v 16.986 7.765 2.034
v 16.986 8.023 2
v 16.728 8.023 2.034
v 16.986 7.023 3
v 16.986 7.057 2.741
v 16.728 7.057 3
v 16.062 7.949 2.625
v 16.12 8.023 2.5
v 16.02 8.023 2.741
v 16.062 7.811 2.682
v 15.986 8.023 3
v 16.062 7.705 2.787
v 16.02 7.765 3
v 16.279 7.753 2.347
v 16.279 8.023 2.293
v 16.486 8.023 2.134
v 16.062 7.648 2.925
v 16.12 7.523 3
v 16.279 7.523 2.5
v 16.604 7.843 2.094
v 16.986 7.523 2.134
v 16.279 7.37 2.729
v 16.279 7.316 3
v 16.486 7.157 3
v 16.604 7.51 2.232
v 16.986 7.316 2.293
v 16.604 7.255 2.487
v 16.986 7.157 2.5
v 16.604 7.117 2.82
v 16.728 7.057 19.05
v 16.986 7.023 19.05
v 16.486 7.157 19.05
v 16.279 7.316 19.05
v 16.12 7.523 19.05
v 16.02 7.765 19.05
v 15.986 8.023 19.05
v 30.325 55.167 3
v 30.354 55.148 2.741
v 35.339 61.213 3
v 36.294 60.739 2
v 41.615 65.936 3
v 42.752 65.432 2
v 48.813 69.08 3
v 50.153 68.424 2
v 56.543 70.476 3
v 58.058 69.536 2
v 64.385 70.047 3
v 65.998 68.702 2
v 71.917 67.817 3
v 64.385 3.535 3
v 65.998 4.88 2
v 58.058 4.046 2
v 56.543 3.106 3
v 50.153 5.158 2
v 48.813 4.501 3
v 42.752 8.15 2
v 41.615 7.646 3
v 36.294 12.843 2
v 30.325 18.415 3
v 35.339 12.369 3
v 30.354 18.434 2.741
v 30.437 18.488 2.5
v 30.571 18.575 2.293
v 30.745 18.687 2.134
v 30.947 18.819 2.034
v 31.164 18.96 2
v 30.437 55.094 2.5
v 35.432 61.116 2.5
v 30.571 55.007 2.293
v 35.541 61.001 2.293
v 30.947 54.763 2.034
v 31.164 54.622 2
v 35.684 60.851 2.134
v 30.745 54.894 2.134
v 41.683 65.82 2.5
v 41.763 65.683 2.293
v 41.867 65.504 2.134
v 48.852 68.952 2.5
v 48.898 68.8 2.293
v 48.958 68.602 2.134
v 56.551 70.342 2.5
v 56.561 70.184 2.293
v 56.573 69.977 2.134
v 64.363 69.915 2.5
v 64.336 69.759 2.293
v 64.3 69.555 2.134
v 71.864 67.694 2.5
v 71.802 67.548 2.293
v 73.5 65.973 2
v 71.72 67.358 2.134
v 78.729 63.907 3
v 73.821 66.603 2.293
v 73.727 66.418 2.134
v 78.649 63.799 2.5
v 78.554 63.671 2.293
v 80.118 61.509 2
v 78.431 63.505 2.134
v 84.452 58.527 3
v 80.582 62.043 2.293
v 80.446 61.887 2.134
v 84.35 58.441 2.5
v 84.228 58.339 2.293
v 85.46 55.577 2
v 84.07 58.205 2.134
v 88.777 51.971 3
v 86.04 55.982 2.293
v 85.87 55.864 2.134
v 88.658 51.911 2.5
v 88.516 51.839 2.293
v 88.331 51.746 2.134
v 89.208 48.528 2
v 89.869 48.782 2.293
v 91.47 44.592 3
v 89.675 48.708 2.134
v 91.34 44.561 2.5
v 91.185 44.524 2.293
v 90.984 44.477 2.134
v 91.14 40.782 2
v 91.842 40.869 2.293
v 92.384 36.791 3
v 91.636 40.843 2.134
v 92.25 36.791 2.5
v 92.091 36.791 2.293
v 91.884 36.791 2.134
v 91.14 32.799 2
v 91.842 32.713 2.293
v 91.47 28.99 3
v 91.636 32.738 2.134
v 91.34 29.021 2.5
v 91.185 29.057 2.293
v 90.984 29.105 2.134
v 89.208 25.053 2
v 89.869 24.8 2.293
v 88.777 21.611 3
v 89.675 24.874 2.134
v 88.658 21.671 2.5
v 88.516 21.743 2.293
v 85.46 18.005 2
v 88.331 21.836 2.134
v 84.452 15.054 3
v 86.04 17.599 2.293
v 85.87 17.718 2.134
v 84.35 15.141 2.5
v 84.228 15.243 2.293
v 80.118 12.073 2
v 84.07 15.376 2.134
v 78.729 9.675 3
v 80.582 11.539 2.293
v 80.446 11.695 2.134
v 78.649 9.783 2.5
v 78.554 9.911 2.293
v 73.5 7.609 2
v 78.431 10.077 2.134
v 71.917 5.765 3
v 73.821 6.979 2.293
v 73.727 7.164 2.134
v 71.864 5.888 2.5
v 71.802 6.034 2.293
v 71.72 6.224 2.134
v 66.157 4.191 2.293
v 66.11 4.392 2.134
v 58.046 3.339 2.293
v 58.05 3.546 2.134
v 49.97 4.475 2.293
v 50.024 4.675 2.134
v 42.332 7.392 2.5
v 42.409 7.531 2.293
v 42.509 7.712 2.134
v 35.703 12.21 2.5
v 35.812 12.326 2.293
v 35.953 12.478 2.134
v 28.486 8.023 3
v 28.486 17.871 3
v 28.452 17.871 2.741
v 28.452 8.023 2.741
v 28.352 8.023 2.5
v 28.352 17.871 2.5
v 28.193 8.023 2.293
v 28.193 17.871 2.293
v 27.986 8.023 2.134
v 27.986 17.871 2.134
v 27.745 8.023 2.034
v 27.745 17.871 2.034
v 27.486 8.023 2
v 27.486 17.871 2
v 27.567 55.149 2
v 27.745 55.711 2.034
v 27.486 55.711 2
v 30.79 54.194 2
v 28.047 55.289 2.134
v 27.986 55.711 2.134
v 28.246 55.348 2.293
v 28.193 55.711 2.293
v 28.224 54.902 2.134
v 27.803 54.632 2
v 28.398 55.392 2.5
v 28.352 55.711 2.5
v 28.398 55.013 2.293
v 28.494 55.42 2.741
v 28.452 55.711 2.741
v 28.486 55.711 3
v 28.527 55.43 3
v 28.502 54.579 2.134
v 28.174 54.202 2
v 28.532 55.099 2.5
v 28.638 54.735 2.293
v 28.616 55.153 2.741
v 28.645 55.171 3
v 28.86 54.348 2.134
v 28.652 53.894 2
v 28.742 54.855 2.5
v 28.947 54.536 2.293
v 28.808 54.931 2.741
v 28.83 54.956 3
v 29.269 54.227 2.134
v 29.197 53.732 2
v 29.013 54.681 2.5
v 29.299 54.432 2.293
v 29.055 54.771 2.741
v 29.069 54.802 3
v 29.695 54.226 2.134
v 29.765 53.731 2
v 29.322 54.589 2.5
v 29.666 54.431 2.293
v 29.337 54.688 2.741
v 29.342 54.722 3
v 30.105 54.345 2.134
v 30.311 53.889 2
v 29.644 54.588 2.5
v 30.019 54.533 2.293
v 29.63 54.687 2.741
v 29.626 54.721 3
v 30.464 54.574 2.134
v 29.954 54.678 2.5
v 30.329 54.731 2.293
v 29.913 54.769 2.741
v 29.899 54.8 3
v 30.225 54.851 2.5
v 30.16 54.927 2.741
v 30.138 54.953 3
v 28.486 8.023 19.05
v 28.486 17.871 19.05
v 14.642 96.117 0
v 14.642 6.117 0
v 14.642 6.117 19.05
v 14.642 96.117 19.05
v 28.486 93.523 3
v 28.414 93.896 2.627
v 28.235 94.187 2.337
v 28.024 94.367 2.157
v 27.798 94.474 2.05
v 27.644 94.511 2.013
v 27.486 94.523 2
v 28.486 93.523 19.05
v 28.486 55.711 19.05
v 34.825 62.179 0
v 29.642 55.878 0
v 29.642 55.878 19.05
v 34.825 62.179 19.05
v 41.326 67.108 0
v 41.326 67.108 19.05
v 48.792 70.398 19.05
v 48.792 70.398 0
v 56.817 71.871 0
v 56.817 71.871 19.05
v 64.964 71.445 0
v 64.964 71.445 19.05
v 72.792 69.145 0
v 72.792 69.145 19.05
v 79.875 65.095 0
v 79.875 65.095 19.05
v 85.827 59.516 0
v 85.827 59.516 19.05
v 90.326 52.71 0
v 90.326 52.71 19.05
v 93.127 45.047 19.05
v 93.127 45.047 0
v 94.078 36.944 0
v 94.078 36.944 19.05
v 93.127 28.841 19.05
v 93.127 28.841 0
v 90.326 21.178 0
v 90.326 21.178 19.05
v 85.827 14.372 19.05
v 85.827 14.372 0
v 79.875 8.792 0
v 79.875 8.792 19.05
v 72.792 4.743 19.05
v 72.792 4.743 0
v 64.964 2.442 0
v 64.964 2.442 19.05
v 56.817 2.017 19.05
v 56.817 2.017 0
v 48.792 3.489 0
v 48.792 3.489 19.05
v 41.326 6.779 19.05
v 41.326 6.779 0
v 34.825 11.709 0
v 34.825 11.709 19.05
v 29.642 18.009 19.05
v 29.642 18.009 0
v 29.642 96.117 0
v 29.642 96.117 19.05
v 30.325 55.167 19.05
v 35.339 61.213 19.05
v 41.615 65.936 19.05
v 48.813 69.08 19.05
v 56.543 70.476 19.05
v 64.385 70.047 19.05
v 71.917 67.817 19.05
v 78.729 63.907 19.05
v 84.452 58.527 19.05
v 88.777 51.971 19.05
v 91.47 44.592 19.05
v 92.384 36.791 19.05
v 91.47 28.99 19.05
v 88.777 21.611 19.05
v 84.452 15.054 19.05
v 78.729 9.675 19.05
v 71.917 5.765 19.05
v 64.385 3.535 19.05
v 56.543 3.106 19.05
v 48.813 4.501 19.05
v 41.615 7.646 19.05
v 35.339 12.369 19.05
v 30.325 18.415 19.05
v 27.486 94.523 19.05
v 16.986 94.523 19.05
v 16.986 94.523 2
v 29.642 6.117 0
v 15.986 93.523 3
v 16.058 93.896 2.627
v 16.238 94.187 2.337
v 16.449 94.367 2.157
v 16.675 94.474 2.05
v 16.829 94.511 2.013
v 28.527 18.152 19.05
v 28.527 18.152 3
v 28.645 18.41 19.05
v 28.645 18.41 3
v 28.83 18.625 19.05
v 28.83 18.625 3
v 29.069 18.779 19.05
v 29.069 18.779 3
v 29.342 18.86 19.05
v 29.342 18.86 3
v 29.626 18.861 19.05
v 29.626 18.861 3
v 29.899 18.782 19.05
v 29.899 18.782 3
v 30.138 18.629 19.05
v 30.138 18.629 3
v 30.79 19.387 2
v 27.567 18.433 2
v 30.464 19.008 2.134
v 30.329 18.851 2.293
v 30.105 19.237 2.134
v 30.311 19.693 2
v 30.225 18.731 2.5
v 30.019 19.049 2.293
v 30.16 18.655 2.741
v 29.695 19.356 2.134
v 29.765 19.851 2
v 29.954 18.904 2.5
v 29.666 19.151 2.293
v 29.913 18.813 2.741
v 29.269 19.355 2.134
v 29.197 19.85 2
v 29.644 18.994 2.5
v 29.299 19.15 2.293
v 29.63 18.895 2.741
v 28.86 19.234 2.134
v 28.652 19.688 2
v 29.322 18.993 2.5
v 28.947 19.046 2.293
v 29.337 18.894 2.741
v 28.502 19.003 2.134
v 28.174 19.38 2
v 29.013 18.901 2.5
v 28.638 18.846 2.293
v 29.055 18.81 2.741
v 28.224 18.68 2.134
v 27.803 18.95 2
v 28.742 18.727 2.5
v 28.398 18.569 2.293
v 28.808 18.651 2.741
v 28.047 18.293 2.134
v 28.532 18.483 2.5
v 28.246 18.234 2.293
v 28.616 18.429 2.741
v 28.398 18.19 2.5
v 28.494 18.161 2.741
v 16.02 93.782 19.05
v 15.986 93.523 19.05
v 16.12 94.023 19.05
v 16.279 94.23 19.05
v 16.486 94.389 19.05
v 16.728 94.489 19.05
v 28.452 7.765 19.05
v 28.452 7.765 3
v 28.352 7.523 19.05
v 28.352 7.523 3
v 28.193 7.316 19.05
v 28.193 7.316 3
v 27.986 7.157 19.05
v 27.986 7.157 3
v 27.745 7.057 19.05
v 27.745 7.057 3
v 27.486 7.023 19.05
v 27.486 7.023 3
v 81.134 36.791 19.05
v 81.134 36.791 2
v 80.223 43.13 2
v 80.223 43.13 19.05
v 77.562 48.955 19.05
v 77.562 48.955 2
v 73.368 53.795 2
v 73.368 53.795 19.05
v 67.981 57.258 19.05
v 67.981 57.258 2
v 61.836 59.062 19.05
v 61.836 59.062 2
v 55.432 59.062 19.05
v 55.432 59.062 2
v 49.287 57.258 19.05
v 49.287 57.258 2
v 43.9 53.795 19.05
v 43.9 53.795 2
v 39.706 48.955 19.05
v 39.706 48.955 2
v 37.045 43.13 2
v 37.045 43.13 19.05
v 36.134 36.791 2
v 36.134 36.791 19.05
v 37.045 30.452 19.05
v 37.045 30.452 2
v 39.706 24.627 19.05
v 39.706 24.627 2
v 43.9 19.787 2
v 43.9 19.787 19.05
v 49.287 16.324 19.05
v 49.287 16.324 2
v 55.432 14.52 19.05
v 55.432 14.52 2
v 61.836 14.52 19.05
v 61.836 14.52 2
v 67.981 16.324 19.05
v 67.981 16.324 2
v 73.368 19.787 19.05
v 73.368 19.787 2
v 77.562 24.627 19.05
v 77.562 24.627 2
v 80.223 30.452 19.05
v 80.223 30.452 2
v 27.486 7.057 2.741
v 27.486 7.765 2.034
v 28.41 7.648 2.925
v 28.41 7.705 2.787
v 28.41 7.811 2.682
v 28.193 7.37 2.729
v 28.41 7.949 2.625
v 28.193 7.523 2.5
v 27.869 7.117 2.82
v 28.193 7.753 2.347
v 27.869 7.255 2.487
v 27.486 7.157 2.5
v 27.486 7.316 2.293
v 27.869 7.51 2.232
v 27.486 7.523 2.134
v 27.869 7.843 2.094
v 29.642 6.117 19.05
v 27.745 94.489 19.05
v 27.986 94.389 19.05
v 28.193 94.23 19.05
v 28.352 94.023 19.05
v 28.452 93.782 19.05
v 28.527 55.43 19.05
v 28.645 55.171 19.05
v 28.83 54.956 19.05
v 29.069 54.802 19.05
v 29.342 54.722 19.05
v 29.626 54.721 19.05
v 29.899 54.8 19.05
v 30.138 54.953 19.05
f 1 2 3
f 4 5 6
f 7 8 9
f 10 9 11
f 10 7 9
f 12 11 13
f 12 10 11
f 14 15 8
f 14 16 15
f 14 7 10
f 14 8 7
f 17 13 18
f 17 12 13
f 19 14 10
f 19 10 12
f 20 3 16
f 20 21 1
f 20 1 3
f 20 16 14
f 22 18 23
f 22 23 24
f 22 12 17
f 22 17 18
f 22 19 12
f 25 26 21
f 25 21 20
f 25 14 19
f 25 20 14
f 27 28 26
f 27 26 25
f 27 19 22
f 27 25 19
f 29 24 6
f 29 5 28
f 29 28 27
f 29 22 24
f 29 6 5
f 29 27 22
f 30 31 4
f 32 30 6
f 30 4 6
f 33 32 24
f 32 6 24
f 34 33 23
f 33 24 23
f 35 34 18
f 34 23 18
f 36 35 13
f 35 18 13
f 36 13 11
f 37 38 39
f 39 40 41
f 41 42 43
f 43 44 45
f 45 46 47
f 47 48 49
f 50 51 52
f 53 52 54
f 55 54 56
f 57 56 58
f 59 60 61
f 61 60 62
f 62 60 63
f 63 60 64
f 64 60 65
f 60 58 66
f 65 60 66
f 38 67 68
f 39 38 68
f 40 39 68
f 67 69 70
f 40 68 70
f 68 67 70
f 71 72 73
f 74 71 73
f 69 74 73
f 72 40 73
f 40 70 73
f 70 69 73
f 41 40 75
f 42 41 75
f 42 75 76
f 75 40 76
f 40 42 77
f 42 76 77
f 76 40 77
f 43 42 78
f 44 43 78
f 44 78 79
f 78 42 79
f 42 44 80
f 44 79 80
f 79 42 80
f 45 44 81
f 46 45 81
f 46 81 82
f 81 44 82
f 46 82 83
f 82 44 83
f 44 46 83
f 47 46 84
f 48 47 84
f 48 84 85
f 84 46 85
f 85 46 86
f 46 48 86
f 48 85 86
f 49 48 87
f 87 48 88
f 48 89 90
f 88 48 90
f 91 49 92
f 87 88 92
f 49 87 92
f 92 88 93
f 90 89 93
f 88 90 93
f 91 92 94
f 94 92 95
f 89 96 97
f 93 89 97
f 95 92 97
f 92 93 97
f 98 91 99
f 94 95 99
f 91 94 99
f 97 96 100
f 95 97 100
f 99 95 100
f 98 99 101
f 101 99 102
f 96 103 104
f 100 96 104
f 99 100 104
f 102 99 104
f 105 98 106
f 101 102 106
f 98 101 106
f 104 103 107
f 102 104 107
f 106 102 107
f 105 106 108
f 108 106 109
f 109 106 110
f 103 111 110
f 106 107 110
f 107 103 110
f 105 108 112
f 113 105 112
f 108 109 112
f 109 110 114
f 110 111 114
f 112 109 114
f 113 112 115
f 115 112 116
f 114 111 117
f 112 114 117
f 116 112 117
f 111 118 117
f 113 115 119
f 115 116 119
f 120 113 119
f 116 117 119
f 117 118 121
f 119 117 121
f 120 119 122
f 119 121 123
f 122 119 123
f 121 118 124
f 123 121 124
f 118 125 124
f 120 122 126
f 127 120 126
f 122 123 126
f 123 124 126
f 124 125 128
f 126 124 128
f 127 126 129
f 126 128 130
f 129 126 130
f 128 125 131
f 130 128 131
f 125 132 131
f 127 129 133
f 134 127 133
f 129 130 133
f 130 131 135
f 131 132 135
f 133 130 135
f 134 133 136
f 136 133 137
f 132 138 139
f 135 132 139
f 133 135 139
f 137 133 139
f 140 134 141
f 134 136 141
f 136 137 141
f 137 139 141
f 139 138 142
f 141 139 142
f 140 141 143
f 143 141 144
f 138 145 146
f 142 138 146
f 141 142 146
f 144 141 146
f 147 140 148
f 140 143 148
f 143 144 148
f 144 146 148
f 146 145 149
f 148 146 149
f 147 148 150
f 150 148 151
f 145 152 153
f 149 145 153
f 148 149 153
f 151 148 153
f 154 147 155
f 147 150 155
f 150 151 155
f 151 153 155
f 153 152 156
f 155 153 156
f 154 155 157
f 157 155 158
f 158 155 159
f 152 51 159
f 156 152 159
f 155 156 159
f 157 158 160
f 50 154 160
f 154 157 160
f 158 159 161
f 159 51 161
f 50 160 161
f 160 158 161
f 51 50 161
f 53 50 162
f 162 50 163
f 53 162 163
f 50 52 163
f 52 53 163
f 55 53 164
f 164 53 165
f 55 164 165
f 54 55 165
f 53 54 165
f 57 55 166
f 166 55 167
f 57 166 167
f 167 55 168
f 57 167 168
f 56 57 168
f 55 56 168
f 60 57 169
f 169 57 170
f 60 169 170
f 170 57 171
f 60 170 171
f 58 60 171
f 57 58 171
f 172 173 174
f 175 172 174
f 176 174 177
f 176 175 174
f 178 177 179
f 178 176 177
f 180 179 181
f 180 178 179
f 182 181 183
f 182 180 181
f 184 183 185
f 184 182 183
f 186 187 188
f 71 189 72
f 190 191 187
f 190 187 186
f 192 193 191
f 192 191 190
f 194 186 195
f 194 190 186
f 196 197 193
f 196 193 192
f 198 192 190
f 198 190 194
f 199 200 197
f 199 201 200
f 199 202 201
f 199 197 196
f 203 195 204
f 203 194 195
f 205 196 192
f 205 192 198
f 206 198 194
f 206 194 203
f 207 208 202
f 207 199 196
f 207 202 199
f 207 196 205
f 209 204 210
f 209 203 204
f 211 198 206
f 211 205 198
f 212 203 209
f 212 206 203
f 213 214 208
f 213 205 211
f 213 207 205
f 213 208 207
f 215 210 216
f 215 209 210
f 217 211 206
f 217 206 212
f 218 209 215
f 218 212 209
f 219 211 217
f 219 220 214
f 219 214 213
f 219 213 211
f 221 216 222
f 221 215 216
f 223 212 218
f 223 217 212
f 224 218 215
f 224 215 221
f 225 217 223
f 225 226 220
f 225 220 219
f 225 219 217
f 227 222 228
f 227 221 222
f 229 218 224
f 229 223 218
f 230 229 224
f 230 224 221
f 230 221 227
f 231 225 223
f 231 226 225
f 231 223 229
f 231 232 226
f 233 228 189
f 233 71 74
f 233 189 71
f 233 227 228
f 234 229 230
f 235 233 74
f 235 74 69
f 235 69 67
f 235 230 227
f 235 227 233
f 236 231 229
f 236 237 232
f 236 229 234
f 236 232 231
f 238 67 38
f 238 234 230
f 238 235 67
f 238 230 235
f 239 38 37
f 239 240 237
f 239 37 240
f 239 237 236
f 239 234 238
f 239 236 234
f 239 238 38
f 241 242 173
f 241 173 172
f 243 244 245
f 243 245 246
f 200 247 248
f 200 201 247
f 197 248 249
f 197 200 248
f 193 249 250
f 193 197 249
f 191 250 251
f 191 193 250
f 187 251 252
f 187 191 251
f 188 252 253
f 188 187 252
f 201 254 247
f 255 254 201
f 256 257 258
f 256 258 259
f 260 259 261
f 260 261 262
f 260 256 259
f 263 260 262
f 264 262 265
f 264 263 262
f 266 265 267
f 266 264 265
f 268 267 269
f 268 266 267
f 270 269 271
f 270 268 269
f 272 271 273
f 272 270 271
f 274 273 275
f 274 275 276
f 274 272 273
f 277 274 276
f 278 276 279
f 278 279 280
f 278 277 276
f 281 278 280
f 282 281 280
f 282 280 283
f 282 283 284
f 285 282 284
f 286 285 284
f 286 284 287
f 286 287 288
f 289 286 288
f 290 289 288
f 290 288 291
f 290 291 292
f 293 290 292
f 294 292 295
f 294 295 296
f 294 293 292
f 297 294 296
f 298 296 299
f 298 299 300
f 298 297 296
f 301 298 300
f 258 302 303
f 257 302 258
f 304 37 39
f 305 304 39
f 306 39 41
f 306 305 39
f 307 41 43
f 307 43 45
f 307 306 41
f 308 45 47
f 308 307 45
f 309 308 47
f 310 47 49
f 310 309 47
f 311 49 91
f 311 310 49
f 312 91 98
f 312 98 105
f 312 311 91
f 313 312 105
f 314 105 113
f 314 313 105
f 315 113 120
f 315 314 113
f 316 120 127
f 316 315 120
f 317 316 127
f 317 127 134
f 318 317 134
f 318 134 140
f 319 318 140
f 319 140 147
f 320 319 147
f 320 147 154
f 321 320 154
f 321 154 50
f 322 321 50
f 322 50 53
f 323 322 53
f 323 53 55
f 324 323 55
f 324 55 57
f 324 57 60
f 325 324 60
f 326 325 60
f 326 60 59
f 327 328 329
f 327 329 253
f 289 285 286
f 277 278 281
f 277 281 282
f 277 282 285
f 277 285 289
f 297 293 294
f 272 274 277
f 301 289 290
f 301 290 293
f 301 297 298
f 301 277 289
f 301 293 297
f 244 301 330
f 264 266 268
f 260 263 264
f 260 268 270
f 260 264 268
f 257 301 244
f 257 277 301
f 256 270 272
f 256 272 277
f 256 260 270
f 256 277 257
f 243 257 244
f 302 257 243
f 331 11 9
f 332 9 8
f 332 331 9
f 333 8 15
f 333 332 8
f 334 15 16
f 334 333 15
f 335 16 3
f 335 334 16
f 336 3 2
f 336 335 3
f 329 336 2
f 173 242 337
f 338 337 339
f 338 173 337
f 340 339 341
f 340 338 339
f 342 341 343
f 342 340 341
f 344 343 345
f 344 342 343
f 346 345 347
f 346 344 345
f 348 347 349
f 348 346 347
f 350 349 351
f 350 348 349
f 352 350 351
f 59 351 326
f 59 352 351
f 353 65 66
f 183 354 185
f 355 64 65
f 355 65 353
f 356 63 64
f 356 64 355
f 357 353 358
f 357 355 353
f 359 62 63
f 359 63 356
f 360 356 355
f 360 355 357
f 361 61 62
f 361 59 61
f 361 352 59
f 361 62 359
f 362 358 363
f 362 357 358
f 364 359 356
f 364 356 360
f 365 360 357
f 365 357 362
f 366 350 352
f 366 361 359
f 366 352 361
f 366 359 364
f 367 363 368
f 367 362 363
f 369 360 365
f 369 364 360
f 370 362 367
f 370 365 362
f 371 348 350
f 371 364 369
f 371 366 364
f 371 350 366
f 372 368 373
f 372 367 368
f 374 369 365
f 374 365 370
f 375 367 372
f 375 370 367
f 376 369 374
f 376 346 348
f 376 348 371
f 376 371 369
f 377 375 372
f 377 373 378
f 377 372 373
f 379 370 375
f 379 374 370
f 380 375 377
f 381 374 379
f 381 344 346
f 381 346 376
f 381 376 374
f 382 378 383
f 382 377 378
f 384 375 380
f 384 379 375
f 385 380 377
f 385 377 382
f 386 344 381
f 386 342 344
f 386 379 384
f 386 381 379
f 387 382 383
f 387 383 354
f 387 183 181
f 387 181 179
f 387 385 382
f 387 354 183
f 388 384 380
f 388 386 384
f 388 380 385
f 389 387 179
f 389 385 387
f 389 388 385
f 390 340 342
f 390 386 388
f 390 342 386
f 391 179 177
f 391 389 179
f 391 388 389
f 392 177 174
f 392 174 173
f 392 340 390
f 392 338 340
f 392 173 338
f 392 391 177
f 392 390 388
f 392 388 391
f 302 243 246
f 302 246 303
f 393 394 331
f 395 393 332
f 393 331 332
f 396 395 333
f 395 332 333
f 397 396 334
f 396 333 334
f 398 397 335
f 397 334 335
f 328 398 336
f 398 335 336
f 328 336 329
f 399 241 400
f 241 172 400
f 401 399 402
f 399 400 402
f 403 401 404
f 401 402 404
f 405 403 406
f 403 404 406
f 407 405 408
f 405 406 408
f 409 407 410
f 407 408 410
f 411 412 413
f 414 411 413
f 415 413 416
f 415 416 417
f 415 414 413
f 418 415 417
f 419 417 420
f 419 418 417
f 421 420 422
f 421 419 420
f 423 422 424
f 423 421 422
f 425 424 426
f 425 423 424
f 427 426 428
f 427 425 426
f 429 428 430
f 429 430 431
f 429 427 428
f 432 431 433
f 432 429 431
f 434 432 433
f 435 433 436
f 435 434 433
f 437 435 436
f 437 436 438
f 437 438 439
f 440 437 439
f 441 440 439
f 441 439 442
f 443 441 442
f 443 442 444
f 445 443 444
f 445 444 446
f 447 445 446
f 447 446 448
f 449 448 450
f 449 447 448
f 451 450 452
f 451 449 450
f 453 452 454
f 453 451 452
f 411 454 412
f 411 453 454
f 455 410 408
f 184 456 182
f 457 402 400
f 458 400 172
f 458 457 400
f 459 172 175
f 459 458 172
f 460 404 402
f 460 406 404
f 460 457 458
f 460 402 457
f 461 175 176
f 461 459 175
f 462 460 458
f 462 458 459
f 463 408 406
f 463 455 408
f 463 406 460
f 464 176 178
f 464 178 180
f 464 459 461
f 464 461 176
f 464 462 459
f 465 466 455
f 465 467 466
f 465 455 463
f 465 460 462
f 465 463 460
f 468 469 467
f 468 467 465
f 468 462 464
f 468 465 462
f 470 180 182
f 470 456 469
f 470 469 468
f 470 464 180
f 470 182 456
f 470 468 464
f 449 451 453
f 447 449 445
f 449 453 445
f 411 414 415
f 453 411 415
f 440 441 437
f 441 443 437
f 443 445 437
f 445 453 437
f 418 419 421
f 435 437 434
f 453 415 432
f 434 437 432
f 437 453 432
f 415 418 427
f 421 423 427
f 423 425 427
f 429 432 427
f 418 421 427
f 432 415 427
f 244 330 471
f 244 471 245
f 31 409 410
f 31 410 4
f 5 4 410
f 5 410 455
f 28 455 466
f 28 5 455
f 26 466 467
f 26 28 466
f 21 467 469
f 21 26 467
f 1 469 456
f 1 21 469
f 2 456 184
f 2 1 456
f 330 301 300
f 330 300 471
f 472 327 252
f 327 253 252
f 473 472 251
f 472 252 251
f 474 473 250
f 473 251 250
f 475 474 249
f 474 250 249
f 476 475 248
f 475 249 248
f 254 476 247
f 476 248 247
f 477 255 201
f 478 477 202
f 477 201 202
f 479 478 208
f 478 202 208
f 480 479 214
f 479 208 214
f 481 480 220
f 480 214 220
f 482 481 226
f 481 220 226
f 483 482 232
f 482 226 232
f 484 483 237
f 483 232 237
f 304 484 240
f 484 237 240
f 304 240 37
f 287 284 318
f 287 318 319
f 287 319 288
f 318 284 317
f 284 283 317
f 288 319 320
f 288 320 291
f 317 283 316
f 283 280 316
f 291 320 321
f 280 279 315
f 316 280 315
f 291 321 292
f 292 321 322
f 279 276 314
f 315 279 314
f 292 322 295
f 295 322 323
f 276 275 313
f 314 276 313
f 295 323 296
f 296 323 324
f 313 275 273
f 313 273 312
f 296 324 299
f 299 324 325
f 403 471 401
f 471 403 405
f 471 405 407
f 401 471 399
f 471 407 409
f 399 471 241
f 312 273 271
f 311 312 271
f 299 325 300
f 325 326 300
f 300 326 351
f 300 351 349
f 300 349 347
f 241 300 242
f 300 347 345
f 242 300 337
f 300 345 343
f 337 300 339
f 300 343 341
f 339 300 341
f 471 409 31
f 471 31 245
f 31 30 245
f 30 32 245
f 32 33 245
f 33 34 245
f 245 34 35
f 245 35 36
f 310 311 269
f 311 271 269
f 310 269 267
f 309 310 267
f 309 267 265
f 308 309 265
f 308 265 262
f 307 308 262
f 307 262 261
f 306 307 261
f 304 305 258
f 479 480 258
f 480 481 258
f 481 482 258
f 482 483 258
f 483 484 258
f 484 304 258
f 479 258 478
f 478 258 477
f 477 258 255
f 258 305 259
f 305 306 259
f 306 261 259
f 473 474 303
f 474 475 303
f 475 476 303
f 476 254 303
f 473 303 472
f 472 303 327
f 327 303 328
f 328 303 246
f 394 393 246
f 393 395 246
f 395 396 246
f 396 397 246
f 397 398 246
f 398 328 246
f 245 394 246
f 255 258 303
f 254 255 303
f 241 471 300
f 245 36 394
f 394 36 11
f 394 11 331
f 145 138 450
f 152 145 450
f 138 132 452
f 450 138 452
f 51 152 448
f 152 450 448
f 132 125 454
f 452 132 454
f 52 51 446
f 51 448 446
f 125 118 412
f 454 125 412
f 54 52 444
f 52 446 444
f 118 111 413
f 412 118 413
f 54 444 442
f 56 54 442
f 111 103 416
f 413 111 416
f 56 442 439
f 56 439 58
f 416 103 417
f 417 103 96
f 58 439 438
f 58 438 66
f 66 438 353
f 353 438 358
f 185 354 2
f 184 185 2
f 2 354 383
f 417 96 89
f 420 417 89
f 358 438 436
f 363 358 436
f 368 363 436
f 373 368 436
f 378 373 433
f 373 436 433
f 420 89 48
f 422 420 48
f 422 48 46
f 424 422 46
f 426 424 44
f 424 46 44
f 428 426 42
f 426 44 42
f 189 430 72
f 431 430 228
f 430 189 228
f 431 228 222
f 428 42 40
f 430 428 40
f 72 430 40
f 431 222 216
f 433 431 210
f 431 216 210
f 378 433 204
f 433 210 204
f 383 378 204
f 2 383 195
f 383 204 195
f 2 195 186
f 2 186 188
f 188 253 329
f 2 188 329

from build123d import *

# Parameters (mm, degrees)
BOSS_EXTRUDE1_DEPTH = 19.05
SKETCH4_R           = 22.5
CUT_EXTRUDE1_DEPTH  = 17.05
FILLET1_R           = 1


with BuildPart() as part:
    # Sketch1 → Boss-Extrude1 (new body)
    with BuildSketch(Plane.XY):
        with BuildLine():
            Line((14.641905013, 96.116783887), (29.641905013, 96.116783887))
            Line((29.641905013, 96.116783887), (29.641905013, 55.878392582))
            ThreePointArc((29.641905013, 55.878392582), (94.077954609, 36.943795037), (29.641905013, 18.009197492))
            Line((29.641905013, 18.009197492), (29.641905013, 6.116783887))
            Line((29.641905013, 6.116783887), (14.641905013, 6.116783887))
            Line((14.641905013, 6.116783887), (14.641905013, 96.116783887))
        make_face()
    extrude(amount=BOSS_EXTRUDE1_DEPTH)

    # Sketch4 → Cut-Extrude1 (cut)
    with BuildSketch(Plane.XY.offset(19.05)):
        with BuildLine():
            Line((28.486331549, 21.619208615), (28.486331549, 7.023321428))
            Line((28.486331549, 7.023321428), (15.986331549, 7.023321428))
            Line((15.986331549, 7.023321428), (15.986331549, 94.523321428))
            Line((15.986331549, 94.523321428), (28.486331549, 94.523321428))
            Line((28.486331549, 94.523321428), (28.486331549, 51.962640383))
            ThreePointArc((28.486331549, 51.962640383), (92.383993766, 36.790924499), (28.486331549, 21.619208615))
        make_face()
        with Locations((58.633993766, 36.790924499)):
            Circle(SKETCH4_R, mode=Mode.SUBTRACT)
    extrude(amount=-CUT_EXTRUDE1_DEPTH, mode=Mode.SUBTRACT)

    # Fillet1
    fillet1_edges = [part.edges().sort_by_distance(p)[0] for p in [
        (22.236331549, 7.023321428, 2),
        (28.486331549, 7.023321428, 10.525),
        (15.986331549, 50.773321428, 2),
        (15.986331549, 7.023321428, 10.525),
        (15.986331549, 94.523321428, 10.525),
        (28.486331549, 73.242980906, 2),
        (28.486331549, 94.523321428, 10.525),
        (92.383993766, 36.790924499, 2),
        (28.486331549, 51.962640383, 10.525),
        (28.486331549, 14.321265022, 2),
        (28.486331549, 21.619208615, 10.525),
    ]]
    fillet(fillet1_edges, radius=FILLET1_R)


solid = part.part
